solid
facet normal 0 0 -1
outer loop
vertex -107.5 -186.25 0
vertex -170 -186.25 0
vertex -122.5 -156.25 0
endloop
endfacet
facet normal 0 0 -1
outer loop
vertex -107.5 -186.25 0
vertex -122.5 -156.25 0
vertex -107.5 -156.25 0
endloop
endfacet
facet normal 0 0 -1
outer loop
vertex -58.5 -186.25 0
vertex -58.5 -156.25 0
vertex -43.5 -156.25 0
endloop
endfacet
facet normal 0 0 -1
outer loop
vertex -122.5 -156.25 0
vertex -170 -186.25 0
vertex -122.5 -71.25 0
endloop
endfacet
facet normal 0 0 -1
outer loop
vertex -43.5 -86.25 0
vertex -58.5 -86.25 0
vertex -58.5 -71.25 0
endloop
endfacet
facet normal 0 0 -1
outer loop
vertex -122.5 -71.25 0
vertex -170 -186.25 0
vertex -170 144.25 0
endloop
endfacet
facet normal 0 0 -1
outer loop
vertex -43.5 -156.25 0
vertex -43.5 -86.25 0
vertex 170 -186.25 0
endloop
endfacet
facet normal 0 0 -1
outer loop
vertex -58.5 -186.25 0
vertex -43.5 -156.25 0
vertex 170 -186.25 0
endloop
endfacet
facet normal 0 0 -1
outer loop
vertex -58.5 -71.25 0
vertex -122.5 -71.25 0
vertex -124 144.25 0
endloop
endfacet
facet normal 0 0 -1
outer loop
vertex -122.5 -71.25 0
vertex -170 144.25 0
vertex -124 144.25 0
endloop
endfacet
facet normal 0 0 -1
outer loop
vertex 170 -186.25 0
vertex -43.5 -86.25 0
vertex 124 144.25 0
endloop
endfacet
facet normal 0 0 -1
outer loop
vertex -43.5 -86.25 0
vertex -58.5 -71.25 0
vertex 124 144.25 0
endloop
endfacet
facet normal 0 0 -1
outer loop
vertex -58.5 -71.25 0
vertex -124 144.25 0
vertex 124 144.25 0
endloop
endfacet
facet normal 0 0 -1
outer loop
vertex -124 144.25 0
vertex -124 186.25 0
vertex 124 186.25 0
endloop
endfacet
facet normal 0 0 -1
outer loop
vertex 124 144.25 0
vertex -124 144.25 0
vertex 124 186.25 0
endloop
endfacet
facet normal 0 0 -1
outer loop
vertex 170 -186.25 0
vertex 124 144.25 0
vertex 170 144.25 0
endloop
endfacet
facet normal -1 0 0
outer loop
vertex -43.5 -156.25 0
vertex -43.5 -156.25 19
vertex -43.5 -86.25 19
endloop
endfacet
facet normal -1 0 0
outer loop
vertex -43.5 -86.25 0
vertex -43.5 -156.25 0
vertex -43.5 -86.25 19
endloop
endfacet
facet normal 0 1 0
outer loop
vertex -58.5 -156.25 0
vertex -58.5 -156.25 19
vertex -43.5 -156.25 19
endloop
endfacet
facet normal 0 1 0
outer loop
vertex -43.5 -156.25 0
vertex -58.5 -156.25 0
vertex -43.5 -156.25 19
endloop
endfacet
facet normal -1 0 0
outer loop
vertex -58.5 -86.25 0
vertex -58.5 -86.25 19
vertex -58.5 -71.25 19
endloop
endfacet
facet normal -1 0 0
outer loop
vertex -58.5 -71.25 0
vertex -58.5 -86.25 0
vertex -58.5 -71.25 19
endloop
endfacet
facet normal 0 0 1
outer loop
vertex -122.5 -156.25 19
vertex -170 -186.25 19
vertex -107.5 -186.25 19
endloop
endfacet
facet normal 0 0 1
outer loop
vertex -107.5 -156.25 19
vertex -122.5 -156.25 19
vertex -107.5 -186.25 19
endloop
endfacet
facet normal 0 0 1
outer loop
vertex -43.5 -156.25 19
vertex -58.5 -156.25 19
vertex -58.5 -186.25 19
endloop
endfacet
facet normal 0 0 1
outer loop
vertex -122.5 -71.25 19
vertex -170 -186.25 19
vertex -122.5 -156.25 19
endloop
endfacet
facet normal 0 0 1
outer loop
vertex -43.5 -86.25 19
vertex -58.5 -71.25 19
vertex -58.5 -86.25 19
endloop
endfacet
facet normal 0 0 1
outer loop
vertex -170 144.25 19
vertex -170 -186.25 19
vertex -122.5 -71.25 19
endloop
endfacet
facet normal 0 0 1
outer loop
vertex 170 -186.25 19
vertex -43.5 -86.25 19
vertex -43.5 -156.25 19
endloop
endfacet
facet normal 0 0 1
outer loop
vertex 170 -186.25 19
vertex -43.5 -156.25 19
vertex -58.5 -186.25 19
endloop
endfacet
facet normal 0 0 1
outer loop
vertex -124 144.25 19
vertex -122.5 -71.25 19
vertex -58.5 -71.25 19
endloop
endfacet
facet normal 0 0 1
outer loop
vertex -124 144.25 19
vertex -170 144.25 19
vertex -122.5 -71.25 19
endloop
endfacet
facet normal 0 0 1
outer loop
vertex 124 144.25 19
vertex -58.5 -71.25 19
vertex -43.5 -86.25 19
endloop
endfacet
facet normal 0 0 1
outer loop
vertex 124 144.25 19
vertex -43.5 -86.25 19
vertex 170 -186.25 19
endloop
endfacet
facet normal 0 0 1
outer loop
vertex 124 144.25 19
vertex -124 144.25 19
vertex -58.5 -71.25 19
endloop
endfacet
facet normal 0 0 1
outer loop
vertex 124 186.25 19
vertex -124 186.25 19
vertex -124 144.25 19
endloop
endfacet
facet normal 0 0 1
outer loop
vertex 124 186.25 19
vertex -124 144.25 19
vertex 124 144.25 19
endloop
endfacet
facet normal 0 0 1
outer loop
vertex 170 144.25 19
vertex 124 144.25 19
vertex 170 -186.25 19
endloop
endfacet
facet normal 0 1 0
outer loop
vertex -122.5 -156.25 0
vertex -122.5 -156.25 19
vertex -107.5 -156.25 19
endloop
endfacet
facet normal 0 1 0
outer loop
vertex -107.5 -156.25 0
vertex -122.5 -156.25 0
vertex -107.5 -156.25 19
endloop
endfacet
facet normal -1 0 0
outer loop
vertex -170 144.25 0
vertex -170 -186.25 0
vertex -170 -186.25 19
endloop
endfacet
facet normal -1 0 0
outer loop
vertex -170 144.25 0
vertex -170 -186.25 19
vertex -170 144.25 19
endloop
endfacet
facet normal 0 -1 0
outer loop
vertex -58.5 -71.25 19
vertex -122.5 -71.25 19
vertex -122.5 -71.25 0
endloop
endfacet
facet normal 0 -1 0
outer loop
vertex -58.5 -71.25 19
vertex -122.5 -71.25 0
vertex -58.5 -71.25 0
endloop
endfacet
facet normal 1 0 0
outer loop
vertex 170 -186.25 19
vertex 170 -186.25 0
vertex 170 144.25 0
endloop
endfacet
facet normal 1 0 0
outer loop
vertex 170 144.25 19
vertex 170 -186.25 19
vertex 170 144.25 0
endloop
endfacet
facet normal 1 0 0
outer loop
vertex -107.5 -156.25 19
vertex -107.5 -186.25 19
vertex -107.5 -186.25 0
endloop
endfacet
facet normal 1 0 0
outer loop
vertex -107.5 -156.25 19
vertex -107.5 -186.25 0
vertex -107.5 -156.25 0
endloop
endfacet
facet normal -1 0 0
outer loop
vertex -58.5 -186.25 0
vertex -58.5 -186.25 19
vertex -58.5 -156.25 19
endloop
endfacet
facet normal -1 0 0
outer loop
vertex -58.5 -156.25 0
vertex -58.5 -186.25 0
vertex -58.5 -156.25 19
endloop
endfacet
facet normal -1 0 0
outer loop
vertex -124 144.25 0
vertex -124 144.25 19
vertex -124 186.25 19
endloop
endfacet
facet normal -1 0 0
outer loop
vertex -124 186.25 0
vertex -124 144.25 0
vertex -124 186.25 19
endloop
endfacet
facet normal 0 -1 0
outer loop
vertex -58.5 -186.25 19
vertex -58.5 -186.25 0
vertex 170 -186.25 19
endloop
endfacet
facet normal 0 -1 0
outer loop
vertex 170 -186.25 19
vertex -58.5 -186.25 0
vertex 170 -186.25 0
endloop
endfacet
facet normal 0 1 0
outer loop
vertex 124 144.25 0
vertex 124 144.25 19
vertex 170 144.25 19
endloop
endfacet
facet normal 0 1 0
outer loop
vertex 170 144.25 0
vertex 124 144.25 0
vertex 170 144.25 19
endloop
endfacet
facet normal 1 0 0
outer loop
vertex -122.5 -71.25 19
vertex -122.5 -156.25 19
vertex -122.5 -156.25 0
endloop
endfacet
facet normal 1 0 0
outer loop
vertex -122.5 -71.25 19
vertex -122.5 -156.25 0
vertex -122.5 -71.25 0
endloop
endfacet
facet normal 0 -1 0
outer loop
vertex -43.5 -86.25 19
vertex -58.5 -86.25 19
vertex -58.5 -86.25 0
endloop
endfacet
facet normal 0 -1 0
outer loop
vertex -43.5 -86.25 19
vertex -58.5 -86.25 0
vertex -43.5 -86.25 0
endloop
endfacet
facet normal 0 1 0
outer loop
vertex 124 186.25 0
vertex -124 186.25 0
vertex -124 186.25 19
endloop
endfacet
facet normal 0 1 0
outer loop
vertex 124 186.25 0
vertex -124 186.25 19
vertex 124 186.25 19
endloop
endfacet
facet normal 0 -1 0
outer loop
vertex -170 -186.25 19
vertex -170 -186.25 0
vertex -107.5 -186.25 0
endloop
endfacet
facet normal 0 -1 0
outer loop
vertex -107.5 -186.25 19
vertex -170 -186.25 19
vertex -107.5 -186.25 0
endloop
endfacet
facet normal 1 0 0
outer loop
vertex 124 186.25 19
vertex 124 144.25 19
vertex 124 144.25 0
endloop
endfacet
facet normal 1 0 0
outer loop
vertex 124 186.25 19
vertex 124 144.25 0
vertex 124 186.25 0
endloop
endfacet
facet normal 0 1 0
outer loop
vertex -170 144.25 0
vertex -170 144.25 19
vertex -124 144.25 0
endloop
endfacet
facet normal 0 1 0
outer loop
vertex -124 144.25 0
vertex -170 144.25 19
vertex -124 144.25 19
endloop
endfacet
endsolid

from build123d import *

# Parameters (mm, degrees)
ESQUISSE1_W             = 340
ESQUISSE1_H             = 372.5
BOSS_EXTRU_1_DEPTH      = 19
ESQUISSE2_W             = 46
ESQUISSE2_H             = 42
ENL_V_MAT_EXTRU_1_DEPTH = 253.883495903
ESQUISSE4_W             = 79
ESQUISSE4_H             = 100
ENL_V_MAT_EXTRU_2_DEPTH = 30
ESQUISSE5_W             = 15
ESQUISSE5_H             = 15
BOSS_EXTRU_2_DEPTH      = 19
ESQUISSE6_W             = 49
ESQUISSE6_H             = 15
ENL_V_MAT_EXTRU_3_DEPTH = 20


with BuildPart() as part:
    # Esquisse1 → Boss.-Extru.1 (new body)
    with BuildSketch(Plane.XY):
        Rectangle(ESQUISSE1_W, ESQUISSE1_H)
    extrude(amount=BOSS_EXTRU_1_DEPTH)

    # Esquisse2 → Enlèv. mat.-Extru.1 (cut, through all)
    with BuildSketch(Plane.XY.offset(19)):
        with Locations((-147, 165.25)):
            Rectangle(ESQUISSE2_W, ESQUISSE2_H)
        with Locations((147, 165.25)):
            Rectangle(ESQUISSE2_W, ESQUISSE2_H)
    extrude(amount=-ENL_V_MAT_EXTRU_1_DEPTH, mode=Mode.SUBTRACT)

    # Esquisse4 → Enlèv. mat.-Extru.2 (cut)
    with BuildSketch(Plane.XY.offset(19)):
        with Locations((-83, -121.25)):
            Rectangle(ESQUISSE4_W, ESQUISSE4_H)
    extrude(amount=-ENL_V_MAT_EXTRU_2_DEPTH, mode=Mode.SUBTRACT)

    # Esquisse5 → Boss.-Extru.2 (add)
    with BuildSketch(Plane.XY.offset(19)):
        with Locations((-51, -163.75)):
            Rectangle(ESQUISSE5_W, ESQUISSE5_H)
        with Locations((-115, -163.75)):
            Rectangle(ESQUISSE5_W, ESQUISSE5_H)
        with Locations((-51, -78.75)):
            Rectangle(ESQUISSE5_W, ESQUISSE5_H)
    extrude(amount=-BOSS_EXTRU_2_DEPTH)

    # Esquisse6 → Enlèv. mat.-Extru.3 (cut)
    with BuildSketch(Plane.XY.offset(19)):
        with Locations((-83, -178.75)):
            Rectangle(ESQUISSE6_W, ESQUISSE6_H)
    extrude(amount=-ENL_V_MAT_EXTRU_3_DEPTH, mode=Mode.SUBTRACT)


solid = part.part
